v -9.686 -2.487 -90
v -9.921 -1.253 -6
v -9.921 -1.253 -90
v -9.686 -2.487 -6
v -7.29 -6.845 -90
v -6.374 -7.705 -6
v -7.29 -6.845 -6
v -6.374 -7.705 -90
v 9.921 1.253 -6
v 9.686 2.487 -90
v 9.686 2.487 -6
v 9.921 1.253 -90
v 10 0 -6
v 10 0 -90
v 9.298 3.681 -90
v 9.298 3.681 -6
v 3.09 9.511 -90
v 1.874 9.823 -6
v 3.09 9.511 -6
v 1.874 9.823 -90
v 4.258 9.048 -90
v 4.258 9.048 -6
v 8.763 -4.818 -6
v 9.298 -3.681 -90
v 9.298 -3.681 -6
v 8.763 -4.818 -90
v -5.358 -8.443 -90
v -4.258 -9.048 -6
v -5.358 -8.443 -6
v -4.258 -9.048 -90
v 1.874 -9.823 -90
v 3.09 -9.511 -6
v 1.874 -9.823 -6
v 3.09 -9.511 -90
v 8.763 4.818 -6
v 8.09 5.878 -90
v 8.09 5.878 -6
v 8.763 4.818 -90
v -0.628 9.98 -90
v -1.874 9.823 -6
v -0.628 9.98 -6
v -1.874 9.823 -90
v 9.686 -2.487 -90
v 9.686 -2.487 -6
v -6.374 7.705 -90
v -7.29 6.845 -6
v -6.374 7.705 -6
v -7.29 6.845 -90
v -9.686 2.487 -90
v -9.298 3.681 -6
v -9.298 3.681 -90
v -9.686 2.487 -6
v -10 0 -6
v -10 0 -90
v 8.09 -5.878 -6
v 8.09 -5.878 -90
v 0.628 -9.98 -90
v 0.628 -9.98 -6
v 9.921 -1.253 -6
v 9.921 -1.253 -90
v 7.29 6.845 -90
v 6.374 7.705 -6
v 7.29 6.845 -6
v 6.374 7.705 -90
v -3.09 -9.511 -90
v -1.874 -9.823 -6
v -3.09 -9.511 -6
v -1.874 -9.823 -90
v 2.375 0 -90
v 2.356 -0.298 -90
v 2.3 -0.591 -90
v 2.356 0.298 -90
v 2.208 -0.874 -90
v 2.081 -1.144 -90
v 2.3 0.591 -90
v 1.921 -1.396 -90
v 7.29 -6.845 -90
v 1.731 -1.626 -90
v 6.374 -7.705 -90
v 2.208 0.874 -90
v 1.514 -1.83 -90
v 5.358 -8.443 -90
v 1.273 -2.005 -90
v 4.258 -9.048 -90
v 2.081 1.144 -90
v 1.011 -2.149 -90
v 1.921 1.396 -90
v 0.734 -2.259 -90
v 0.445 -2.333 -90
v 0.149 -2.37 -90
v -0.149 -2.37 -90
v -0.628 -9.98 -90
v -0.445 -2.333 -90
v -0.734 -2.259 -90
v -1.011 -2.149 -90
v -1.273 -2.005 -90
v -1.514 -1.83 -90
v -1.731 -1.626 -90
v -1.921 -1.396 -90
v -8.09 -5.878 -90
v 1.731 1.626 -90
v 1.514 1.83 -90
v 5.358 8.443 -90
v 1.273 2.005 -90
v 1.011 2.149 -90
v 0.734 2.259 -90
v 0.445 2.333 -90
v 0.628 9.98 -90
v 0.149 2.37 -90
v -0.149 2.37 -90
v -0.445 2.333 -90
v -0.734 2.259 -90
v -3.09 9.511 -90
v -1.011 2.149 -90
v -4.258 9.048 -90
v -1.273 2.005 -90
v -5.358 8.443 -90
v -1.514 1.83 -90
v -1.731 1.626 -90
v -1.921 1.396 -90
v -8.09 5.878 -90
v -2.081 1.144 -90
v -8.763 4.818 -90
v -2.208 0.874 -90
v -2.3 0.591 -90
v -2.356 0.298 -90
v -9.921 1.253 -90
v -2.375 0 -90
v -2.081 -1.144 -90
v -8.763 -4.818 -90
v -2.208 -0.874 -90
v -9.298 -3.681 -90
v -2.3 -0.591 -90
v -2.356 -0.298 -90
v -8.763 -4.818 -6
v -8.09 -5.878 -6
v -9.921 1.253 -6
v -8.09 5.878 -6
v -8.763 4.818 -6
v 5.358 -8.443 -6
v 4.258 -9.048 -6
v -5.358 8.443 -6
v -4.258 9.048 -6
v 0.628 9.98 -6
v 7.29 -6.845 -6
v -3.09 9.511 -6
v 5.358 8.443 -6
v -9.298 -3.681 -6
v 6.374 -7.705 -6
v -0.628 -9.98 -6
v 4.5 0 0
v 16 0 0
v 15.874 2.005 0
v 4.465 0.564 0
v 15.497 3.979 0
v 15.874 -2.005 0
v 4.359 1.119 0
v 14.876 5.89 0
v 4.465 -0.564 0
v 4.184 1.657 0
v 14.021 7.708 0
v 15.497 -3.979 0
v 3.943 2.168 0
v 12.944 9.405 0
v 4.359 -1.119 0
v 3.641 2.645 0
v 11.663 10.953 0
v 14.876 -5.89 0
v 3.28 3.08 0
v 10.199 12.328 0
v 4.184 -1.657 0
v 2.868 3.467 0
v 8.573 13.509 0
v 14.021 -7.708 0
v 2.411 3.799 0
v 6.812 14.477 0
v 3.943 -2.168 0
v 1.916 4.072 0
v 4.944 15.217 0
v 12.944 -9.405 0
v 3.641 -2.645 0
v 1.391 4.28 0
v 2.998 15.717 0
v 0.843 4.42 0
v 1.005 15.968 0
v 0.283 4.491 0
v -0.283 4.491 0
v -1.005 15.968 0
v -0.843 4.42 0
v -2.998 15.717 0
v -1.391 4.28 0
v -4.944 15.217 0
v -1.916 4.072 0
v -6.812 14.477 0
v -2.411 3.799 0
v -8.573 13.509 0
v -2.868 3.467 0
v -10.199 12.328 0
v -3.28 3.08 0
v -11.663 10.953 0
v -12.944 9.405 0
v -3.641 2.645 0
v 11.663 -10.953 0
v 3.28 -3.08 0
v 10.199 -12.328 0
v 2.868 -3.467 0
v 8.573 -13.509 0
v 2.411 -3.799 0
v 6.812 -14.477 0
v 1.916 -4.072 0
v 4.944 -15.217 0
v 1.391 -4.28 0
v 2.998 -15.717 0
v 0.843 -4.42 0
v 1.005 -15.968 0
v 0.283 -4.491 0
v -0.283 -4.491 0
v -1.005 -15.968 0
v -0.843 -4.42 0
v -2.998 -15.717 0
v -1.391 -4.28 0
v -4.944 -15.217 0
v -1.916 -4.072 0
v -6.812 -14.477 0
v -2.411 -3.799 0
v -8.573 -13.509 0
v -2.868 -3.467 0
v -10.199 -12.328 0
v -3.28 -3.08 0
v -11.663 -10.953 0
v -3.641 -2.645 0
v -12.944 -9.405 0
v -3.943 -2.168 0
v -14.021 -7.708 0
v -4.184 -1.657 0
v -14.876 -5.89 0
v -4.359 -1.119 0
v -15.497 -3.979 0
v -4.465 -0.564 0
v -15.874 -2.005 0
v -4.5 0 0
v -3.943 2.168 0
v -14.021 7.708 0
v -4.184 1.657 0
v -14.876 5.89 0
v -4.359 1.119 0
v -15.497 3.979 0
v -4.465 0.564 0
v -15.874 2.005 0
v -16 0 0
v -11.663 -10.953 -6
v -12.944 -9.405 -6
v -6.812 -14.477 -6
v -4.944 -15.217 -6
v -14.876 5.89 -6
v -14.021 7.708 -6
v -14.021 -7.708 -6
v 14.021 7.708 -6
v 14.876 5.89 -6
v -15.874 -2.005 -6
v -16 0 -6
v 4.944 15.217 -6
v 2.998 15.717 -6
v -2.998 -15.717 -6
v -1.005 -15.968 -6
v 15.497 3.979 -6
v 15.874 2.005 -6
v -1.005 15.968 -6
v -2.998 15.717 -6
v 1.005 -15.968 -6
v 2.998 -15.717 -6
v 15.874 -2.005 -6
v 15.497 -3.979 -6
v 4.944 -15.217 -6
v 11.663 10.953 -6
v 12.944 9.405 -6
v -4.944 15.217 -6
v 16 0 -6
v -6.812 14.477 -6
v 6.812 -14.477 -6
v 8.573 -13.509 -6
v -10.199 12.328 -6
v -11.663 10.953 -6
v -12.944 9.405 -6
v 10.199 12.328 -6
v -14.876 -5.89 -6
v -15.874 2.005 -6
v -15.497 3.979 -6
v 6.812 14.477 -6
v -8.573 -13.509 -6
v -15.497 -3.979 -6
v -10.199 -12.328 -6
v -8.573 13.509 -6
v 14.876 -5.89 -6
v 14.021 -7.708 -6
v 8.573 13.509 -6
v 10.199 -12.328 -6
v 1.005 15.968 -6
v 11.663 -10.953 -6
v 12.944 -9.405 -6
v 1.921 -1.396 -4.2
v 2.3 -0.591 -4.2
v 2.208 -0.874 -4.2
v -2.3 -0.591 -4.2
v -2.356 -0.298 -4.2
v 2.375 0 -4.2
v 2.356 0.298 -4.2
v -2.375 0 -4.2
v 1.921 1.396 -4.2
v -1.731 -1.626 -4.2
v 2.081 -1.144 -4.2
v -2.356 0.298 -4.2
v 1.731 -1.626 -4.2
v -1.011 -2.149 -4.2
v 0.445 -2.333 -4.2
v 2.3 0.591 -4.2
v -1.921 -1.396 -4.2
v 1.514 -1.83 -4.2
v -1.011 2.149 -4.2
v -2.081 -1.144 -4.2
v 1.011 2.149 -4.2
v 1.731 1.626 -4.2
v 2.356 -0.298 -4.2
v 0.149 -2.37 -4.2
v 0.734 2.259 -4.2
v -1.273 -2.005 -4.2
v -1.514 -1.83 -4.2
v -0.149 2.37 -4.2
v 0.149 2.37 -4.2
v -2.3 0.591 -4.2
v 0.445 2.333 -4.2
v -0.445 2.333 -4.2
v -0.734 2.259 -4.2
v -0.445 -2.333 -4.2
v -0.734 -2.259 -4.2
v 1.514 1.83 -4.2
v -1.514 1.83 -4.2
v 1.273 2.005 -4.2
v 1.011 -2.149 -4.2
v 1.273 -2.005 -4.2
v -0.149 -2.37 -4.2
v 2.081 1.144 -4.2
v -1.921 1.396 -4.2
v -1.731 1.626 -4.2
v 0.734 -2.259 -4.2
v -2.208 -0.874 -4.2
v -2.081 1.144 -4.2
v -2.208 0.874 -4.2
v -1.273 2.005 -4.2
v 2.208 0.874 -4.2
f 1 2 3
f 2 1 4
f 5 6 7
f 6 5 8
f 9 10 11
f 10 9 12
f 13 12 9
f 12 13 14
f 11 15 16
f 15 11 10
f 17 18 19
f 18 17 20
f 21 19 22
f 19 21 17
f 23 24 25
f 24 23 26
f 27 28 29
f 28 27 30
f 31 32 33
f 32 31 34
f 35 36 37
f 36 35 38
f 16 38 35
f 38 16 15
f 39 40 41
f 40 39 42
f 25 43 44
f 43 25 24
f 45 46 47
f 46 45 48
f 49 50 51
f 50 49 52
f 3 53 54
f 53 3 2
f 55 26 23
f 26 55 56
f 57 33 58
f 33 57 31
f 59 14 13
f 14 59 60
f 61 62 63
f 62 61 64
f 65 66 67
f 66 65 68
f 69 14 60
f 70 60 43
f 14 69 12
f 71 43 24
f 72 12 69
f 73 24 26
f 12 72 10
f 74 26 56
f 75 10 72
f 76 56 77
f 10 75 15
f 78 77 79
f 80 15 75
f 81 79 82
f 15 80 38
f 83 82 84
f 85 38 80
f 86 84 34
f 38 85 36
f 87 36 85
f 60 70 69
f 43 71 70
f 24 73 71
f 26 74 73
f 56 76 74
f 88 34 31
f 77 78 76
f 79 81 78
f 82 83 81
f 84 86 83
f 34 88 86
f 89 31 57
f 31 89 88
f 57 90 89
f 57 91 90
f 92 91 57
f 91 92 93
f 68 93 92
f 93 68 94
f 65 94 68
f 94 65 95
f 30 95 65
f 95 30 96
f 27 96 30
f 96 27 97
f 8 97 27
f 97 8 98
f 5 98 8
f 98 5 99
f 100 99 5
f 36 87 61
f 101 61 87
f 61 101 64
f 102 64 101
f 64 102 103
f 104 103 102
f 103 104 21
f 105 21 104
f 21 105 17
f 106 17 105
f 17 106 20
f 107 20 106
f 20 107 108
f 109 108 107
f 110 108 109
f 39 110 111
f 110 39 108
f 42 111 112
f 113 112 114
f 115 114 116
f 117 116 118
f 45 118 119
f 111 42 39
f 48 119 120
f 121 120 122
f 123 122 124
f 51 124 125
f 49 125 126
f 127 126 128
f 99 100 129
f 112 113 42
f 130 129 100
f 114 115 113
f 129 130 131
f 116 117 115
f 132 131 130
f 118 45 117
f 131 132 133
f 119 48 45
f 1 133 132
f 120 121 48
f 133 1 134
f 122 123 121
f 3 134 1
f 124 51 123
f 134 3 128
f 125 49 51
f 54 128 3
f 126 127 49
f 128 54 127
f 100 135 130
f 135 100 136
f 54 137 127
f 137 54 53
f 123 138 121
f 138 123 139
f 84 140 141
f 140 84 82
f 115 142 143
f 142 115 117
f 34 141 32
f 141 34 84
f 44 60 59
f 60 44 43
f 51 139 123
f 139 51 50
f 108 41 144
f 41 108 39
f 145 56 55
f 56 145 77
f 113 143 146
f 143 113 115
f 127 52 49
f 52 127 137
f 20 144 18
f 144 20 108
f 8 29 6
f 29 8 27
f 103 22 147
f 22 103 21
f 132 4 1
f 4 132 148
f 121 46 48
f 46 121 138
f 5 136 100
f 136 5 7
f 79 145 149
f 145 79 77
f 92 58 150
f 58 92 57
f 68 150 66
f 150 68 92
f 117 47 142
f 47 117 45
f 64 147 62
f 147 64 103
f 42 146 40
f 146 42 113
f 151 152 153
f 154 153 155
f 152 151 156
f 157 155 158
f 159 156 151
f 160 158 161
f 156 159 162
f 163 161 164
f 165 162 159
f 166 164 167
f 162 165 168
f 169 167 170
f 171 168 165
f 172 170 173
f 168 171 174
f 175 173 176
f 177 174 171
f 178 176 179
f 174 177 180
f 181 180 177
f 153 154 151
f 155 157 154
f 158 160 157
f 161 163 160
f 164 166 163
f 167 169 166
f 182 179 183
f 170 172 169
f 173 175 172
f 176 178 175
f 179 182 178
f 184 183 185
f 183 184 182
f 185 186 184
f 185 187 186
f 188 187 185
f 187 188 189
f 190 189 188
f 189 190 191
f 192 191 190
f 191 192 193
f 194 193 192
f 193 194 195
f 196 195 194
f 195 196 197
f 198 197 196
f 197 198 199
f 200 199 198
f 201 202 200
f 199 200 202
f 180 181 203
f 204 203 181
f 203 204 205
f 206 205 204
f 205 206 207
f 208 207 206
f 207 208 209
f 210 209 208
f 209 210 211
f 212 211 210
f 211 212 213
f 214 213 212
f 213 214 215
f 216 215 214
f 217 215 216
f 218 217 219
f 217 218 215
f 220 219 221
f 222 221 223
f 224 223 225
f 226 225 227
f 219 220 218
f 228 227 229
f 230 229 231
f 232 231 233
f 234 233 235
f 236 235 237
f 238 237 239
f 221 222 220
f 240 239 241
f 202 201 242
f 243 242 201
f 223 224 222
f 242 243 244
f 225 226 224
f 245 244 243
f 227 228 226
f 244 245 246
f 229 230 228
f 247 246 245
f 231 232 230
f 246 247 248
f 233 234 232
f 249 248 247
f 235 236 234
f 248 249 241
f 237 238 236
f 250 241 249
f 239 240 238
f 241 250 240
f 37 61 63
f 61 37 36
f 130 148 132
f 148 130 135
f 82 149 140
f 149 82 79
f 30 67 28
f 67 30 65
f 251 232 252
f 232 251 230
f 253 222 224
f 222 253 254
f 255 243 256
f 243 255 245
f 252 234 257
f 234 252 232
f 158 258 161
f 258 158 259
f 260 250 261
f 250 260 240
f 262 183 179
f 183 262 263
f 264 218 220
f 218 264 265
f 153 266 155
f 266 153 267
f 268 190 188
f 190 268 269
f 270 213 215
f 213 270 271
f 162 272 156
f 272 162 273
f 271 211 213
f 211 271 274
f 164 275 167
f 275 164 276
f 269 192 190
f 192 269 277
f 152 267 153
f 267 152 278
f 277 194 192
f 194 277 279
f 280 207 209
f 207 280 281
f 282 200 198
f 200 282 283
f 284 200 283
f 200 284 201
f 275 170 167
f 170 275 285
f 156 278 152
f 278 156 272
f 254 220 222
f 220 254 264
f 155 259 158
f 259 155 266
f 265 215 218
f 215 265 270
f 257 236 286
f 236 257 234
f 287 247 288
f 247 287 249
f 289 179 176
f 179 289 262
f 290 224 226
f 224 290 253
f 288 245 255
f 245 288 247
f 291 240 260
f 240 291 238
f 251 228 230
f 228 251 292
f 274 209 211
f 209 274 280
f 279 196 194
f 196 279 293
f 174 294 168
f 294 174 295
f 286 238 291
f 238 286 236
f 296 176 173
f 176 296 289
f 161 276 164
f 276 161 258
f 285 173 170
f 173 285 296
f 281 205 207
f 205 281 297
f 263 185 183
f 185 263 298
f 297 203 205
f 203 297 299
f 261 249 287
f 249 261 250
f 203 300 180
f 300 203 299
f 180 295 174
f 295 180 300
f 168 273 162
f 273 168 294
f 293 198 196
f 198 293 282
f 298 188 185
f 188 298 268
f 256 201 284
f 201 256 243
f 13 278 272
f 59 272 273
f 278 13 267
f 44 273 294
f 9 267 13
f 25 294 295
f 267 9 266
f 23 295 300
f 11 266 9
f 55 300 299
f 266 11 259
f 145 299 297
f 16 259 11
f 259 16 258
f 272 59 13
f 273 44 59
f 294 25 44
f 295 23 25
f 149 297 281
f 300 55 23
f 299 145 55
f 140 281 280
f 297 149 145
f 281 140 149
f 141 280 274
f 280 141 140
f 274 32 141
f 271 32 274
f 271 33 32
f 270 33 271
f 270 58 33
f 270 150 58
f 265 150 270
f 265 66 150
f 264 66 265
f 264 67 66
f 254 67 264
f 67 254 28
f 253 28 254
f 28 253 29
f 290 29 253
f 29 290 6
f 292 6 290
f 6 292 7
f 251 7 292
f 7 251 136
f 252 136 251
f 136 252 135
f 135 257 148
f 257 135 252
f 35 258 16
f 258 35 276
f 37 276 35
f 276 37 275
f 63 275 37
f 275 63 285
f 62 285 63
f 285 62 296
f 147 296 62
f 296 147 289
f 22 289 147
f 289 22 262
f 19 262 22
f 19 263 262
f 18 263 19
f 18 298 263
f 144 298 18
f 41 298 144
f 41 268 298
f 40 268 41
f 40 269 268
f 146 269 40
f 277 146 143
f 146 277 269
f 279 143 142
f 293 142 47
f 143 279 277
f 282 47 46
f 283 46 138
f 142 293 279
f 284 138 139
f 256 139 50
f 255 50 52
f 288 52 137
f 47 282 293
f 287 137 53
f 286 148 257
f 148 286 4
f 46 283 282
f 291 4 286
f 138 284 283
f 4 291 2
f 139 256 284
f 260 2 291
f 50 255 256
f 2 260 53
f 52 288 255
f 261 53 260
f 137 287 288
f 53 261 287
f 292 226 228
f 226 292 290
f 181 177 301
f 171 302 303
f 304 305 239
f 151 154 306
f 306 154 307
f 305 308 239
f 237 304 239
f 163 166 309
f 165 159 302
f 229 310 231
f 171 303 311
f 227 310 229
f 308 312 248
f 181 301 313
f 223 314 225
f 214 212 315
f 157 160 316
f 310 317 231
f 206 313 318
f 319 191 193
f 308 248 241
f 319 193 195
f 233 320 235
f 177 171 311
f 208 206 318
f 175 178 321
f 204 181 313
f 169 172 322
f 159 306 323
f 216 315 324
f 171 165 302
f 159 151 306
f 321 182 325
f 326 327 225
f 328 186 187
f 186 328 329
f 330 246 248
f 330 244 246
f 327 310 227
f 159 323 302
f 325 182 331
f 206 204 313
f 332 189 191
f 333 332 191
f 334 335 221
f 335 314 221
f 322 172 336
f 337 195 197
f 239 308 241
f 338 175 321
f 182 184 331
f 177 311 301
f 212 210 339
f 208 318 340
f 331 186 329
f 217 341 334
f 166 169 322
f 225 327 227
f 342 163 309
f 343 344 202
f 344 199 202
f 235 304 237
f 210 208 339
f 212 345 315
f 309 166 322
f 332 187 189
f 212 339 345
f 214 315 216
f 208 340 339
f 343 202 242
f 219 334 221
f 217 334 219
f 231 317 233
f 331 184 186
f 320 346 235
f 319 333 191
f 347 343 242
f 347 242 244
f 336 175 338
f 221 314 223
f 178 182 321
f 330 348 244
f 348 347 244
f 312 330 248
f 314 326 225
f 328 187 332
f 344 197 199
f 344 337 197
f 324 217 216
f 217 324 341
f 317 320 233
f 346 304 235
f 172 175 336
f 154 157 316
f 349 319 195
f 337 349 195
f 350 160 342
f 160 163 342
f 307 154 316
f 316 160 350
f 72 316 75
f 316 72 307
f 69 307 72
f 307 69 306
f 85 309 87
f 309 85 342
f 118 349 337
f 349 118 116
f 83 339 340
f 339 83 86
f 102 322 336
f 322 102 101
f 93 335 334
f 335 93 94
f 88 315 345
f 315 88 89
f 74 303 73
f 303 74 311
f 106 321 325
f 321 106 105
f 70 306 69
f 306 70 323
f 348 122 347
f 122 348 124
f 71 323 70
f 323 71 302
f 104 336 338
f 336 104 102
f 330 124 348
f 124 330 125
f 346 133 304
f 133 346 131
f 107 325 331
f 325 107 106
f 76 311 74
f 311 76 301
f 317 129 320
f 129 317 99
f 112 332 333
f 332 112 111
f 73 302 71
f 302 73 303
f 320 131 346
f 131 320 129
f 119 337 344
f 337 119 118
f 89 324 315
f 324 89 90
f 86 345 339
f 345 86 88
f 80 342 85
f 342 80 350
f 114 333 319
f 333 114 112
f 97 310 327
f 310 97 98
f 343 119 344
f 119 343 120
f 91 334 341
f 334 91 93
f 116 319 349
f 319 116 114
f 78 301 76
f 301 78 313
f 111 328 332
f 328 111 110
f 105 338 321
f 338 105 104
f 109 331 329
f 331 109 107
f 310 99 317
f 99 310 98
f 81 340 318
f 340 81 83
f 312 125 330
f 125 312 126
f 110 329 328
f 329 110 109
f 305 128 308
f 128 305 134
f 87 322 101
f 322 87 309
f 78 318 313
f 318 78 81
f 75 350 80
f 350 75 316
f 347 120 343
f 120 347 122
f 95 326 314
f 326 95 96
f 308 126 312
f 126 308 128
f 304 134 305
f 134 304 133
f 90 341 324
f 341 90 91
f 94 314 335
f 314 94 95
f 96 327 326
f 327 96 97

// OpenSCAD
$fn = 50;


difference() {
	union() {
		translate(v = [0, 0, -90.0000000000]) {
			cylinder(h = 90, r = 10.0000000000);
		}
		translate(v = [0, 0, -6.0000000000]) {
			cylinder(h = 6, r = 16.0000000000);
		}
	}
	union() {
		translate(v = [0, 0, 0]) {
			rotate(a = [0, 0, 0]) {
				difference() {
					union() {
						#translate(v = [0, 0, -90.0000000000]) {
							cylinder(h = 90, r = 2.2500000000);
						}
						#translate(v = [0, 0, -4.2000000000]) {
							cylinder(h = 4.2000000000, r1 = 2.3750000000, r2 = 4.5000000000);
						}
						#translate(v = [0, 0, -90.0000000000]) {
							cylinder(h = 90, r = 2.3750000000);
						}
						#translate(v = [0, 0, -90.0000000000]) {
							cylinder(h = 90, r = 2.2500000000);
						}
					}
					union();
				}
			}
		}
	}
}
